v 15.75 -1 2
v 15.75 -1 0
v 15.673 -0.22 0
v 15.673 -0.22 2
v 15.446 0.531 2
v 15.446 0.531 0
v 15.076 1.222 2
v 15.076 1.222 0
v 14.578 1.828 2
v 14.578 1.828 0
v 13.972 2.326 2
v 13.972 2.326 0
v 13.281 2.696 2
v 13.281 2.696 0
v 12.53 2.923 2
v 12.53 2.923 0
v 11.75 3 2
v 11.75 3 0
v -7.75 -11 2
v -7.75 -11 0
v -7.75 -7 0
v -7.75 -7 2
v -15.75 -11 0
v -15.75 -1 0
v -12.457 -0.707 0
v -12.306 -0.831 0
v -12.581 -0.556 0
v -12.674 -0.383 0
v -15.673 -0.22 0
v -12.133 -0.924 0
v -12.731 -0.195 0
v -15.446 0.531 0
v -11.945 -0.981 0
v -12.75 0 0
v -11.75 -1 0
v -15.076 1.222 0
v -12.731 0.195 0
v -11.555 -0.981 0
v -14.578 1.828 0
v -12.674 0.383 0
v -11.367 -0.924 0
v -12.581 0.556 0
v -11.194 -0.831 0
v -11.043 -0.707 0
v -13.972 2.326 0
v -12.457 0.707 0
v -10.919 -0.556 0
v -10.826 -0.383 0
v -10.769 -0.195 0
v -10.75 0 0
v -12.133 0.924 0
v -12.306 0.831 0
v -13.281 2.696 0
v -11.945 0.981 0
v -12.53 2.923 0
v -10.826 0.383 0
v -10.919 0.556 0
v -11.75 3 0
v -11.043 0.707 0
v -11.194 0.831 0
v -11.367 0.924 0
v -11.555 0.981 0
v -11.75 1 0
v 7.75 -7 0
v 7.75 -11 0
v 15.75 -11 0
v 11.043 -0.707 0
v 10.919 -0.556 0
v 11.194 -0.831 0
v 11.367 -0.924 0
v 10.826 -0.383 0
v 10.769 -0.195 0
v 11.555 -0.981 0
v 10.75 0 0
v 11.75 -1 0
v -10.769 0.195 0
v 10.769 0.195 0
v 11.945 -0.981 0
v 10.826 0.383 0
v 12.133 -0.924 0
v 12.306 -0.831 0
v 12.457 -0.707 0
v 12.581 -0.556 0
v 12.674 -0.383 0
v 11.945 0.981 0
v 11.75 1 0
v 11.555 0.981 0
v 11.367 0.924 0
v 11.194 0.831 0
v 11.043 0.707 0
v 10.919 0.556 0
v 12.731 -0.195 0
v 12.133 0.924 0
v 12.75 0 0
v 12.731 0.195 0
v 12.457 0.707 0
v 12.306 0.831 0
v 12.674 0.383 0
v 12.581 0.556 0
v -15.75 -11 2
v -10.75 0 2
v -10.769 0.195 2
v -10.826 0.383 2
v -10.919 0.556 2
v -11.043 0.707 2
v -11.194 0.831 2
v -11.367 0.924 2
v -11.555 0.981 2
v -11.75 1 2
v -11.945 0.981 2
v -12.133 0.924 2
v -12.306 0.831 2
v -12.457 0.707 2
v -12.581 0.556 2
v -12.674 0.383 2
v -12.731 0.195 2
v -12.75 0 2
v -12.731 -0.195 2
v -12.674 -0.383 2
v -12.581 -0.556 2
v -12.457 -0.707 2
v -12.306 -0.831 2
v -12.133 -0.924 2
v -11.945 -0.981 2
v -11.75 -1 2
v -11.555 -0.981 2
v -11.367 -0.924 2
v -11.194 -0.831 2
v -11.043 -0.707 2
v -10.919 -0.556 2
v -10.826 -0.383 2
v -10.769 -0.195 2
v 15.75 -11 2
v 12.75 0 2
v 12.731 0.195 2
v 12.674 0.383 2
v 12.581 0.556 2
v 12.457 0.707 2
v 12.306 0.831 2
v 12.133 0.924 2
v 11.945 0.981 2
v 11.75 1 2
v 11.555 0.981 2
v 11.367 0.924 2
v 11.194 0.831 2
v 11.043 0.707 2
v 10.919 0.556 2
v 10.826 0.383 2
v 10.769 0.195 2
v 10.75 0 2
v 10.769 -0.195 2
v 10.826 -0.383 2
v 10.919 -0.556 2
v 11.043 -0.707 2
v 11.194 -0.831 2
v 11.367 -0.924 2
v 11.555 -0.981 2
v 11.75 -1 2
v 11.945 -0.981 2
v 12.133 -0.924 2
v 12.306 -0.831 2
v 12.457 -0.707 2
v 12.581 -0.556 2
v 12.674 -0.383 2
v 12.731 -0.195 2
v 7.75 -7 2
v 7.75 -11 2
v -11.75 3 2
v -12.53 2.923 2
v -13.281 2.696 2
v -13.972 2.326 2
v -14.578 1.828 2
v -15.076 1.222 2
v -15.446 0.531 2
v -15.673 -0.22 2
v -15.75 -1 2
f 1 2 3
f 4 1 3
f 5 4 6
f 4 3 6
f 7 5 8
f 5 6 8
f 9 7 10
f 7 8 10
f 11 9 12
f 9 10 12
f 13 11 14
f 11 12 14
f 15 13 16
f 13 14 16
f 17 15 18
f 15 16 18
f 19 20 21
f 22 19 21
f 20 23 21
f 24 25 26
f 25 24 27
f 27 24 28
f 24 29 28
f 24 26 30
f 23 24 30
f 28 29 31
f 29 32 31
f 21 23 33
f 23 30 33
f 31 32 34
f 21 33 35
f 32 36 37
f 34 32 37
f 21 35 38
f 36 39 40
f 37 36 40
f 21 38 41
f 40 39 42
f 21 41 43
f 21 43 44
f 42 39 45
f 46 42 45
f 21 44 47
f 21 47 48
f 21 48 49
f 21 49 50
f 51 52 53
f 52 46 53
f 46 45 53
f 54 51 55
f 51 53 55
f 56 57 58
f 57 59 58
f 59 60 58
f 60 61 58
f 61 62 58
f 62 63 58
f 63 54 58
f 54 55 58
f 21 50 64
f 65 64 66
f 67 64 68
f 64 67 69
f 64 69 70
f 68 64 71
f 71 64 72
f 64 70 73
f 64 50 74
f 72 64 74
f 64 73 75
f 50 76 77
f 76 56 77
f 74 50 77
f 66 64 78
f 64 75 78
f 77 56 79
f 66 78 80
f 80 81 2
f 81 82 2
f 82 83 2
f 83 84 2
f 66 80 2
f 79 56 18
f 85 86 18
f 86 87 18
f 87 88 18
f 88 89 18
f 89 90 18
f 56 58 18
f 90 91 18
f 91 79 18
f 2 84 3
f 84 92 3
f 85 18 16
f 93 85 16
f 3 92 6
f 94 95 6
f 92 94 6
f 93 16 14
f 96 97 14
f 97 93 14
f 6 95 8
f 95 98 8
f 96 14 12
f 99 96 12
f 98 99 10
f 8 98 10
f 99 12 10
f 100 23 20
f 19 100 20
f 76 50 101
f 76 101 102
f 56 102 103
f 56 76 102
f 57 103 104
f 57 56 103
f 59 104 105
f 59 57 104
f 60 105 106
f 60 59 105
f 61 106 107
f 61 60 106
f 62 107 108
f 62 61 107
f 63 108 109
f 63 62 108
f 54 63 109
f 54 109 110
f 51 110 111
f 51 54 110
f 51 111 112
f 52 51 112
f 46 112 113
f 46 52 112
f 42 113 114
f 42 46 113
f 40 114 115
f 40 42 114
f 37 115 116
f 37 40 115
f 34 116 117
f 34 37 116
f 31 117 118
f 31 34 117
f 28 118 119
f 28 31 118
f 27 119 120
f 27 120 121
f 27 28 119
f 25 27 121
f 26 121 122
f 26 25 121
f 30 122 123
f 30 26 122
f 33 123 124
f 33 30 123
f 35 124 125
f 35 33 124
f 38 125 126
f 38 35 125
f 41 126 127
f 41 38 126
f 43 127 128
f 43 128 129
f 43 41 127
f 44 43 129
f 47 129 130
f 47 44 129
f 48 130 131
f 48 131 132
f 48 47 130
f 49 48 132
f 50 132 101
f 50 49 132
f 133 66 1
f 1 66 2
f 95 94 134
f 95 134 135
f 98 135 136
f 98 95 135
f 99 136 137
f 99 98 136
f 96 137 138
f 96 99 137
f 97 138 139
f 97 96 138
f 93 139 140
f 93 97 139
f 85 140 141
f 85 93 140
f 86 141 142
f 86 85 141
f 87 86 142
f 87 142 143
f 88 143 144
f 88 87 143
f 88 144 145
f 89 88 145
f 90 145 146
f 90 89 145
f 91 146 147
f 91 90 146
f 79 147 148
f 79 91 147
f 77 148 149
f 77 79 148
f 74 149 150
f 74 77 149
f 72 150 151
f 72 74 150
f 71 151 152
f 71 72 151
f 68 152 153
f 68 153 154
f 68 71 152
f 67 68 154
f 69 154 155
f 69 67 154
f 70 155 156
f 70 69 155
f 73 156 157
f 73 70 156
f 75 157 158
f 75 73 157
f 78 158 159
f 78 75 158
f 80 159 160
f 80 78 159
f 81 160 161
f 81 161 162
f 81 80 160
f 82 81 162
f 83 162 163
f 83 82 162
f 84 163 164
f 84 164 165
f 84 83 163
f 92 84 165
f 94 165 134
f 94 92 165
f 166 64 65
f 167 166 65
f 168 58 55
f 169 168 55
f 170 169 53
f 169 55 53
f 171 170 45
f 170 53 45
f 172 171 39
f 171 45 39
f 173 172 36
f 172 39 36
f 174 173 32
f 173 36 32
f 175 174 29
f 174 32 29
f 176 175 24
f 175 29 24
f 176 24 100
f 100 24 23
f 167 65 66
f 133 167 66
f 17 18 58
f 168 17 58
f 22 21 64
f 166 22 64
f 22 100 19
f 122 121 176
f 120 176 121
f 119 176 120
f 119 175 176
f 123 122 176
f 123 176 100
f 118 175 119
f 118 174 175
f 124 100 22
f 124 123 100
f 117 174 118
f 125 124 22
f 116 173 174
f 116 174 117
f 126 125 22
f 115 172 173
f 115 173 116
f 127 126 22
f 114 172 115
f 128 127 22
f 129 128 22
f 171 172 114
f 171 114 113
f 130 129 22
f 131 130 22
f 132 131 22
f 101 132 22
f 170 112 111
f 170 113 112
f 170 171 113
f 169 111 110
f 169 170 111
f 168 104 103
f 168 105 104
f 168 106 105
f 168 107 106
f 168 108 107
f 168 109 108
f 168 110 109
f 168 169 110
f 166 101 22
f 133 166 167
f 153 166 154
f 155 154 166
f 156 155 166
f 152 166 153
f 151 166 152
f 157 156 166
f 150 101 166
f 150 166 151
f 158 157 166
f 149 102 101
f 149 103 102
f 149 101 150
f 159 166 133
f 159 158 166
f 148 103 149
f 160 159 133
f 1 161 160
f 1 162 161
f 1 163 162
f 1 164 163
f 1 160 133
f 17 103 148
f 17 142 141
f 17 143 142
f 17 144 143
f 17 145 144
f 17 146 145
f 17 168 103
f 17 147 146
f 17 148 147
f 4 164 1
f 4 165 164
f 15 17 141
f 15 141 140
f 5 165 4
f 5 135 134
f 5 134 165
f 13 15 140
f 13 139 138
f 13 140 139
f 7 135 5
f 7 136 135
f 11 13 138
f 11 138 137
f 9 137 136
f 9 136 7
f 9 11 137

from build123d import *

# Parameters (mm, degrees)
SKETCH1_R           = 1
BOSS_EXTRUDE1_DEPTH = 2


with BuildPart() as part:
    # Sketch1 → Boss-Extrude1 (new body)
    with BuildSketch(Plane.XY):
        with BuildLine():
            Line((-15.75, -7), (-15.75, -11))
            Line((-15.75, -11), (-7.75, -11))
            Line((-7.75, -11), (-7.75, -7))
            Line((-7.75, -7), (7.75, -7))
            Line((7.75, -7), (7.75, -11))
            Line((7.75, -11), (15.75, -11))
            Line((15.75, -11), (15.75, -7))
            Line((15.75, -7), (15.75, -1))
            ThreePointArc((15.75, -1), (14.578427125, 1.828427125), (11.75, 3))
            Line((11.75, 3), (-11.75, 3))
            ThreePointArc((-11.75, 3), (-14.578427125, 1.828427125), (-15.75, -1))
            Line((-15.75, -1), (-15.75, -7))
        make_face()
        with Locations((-11.75, 0)):
            Circle(SKETCH1_R, mode=Mode.SUBTRACT)
        with Locations((11.75, 0)):
            Circle(SKETCH1_R, mode=Mode.SUBTRACT)
    extrude(amount=BOSS_EXTRUDE1_DEPTH)


solid = part.part
